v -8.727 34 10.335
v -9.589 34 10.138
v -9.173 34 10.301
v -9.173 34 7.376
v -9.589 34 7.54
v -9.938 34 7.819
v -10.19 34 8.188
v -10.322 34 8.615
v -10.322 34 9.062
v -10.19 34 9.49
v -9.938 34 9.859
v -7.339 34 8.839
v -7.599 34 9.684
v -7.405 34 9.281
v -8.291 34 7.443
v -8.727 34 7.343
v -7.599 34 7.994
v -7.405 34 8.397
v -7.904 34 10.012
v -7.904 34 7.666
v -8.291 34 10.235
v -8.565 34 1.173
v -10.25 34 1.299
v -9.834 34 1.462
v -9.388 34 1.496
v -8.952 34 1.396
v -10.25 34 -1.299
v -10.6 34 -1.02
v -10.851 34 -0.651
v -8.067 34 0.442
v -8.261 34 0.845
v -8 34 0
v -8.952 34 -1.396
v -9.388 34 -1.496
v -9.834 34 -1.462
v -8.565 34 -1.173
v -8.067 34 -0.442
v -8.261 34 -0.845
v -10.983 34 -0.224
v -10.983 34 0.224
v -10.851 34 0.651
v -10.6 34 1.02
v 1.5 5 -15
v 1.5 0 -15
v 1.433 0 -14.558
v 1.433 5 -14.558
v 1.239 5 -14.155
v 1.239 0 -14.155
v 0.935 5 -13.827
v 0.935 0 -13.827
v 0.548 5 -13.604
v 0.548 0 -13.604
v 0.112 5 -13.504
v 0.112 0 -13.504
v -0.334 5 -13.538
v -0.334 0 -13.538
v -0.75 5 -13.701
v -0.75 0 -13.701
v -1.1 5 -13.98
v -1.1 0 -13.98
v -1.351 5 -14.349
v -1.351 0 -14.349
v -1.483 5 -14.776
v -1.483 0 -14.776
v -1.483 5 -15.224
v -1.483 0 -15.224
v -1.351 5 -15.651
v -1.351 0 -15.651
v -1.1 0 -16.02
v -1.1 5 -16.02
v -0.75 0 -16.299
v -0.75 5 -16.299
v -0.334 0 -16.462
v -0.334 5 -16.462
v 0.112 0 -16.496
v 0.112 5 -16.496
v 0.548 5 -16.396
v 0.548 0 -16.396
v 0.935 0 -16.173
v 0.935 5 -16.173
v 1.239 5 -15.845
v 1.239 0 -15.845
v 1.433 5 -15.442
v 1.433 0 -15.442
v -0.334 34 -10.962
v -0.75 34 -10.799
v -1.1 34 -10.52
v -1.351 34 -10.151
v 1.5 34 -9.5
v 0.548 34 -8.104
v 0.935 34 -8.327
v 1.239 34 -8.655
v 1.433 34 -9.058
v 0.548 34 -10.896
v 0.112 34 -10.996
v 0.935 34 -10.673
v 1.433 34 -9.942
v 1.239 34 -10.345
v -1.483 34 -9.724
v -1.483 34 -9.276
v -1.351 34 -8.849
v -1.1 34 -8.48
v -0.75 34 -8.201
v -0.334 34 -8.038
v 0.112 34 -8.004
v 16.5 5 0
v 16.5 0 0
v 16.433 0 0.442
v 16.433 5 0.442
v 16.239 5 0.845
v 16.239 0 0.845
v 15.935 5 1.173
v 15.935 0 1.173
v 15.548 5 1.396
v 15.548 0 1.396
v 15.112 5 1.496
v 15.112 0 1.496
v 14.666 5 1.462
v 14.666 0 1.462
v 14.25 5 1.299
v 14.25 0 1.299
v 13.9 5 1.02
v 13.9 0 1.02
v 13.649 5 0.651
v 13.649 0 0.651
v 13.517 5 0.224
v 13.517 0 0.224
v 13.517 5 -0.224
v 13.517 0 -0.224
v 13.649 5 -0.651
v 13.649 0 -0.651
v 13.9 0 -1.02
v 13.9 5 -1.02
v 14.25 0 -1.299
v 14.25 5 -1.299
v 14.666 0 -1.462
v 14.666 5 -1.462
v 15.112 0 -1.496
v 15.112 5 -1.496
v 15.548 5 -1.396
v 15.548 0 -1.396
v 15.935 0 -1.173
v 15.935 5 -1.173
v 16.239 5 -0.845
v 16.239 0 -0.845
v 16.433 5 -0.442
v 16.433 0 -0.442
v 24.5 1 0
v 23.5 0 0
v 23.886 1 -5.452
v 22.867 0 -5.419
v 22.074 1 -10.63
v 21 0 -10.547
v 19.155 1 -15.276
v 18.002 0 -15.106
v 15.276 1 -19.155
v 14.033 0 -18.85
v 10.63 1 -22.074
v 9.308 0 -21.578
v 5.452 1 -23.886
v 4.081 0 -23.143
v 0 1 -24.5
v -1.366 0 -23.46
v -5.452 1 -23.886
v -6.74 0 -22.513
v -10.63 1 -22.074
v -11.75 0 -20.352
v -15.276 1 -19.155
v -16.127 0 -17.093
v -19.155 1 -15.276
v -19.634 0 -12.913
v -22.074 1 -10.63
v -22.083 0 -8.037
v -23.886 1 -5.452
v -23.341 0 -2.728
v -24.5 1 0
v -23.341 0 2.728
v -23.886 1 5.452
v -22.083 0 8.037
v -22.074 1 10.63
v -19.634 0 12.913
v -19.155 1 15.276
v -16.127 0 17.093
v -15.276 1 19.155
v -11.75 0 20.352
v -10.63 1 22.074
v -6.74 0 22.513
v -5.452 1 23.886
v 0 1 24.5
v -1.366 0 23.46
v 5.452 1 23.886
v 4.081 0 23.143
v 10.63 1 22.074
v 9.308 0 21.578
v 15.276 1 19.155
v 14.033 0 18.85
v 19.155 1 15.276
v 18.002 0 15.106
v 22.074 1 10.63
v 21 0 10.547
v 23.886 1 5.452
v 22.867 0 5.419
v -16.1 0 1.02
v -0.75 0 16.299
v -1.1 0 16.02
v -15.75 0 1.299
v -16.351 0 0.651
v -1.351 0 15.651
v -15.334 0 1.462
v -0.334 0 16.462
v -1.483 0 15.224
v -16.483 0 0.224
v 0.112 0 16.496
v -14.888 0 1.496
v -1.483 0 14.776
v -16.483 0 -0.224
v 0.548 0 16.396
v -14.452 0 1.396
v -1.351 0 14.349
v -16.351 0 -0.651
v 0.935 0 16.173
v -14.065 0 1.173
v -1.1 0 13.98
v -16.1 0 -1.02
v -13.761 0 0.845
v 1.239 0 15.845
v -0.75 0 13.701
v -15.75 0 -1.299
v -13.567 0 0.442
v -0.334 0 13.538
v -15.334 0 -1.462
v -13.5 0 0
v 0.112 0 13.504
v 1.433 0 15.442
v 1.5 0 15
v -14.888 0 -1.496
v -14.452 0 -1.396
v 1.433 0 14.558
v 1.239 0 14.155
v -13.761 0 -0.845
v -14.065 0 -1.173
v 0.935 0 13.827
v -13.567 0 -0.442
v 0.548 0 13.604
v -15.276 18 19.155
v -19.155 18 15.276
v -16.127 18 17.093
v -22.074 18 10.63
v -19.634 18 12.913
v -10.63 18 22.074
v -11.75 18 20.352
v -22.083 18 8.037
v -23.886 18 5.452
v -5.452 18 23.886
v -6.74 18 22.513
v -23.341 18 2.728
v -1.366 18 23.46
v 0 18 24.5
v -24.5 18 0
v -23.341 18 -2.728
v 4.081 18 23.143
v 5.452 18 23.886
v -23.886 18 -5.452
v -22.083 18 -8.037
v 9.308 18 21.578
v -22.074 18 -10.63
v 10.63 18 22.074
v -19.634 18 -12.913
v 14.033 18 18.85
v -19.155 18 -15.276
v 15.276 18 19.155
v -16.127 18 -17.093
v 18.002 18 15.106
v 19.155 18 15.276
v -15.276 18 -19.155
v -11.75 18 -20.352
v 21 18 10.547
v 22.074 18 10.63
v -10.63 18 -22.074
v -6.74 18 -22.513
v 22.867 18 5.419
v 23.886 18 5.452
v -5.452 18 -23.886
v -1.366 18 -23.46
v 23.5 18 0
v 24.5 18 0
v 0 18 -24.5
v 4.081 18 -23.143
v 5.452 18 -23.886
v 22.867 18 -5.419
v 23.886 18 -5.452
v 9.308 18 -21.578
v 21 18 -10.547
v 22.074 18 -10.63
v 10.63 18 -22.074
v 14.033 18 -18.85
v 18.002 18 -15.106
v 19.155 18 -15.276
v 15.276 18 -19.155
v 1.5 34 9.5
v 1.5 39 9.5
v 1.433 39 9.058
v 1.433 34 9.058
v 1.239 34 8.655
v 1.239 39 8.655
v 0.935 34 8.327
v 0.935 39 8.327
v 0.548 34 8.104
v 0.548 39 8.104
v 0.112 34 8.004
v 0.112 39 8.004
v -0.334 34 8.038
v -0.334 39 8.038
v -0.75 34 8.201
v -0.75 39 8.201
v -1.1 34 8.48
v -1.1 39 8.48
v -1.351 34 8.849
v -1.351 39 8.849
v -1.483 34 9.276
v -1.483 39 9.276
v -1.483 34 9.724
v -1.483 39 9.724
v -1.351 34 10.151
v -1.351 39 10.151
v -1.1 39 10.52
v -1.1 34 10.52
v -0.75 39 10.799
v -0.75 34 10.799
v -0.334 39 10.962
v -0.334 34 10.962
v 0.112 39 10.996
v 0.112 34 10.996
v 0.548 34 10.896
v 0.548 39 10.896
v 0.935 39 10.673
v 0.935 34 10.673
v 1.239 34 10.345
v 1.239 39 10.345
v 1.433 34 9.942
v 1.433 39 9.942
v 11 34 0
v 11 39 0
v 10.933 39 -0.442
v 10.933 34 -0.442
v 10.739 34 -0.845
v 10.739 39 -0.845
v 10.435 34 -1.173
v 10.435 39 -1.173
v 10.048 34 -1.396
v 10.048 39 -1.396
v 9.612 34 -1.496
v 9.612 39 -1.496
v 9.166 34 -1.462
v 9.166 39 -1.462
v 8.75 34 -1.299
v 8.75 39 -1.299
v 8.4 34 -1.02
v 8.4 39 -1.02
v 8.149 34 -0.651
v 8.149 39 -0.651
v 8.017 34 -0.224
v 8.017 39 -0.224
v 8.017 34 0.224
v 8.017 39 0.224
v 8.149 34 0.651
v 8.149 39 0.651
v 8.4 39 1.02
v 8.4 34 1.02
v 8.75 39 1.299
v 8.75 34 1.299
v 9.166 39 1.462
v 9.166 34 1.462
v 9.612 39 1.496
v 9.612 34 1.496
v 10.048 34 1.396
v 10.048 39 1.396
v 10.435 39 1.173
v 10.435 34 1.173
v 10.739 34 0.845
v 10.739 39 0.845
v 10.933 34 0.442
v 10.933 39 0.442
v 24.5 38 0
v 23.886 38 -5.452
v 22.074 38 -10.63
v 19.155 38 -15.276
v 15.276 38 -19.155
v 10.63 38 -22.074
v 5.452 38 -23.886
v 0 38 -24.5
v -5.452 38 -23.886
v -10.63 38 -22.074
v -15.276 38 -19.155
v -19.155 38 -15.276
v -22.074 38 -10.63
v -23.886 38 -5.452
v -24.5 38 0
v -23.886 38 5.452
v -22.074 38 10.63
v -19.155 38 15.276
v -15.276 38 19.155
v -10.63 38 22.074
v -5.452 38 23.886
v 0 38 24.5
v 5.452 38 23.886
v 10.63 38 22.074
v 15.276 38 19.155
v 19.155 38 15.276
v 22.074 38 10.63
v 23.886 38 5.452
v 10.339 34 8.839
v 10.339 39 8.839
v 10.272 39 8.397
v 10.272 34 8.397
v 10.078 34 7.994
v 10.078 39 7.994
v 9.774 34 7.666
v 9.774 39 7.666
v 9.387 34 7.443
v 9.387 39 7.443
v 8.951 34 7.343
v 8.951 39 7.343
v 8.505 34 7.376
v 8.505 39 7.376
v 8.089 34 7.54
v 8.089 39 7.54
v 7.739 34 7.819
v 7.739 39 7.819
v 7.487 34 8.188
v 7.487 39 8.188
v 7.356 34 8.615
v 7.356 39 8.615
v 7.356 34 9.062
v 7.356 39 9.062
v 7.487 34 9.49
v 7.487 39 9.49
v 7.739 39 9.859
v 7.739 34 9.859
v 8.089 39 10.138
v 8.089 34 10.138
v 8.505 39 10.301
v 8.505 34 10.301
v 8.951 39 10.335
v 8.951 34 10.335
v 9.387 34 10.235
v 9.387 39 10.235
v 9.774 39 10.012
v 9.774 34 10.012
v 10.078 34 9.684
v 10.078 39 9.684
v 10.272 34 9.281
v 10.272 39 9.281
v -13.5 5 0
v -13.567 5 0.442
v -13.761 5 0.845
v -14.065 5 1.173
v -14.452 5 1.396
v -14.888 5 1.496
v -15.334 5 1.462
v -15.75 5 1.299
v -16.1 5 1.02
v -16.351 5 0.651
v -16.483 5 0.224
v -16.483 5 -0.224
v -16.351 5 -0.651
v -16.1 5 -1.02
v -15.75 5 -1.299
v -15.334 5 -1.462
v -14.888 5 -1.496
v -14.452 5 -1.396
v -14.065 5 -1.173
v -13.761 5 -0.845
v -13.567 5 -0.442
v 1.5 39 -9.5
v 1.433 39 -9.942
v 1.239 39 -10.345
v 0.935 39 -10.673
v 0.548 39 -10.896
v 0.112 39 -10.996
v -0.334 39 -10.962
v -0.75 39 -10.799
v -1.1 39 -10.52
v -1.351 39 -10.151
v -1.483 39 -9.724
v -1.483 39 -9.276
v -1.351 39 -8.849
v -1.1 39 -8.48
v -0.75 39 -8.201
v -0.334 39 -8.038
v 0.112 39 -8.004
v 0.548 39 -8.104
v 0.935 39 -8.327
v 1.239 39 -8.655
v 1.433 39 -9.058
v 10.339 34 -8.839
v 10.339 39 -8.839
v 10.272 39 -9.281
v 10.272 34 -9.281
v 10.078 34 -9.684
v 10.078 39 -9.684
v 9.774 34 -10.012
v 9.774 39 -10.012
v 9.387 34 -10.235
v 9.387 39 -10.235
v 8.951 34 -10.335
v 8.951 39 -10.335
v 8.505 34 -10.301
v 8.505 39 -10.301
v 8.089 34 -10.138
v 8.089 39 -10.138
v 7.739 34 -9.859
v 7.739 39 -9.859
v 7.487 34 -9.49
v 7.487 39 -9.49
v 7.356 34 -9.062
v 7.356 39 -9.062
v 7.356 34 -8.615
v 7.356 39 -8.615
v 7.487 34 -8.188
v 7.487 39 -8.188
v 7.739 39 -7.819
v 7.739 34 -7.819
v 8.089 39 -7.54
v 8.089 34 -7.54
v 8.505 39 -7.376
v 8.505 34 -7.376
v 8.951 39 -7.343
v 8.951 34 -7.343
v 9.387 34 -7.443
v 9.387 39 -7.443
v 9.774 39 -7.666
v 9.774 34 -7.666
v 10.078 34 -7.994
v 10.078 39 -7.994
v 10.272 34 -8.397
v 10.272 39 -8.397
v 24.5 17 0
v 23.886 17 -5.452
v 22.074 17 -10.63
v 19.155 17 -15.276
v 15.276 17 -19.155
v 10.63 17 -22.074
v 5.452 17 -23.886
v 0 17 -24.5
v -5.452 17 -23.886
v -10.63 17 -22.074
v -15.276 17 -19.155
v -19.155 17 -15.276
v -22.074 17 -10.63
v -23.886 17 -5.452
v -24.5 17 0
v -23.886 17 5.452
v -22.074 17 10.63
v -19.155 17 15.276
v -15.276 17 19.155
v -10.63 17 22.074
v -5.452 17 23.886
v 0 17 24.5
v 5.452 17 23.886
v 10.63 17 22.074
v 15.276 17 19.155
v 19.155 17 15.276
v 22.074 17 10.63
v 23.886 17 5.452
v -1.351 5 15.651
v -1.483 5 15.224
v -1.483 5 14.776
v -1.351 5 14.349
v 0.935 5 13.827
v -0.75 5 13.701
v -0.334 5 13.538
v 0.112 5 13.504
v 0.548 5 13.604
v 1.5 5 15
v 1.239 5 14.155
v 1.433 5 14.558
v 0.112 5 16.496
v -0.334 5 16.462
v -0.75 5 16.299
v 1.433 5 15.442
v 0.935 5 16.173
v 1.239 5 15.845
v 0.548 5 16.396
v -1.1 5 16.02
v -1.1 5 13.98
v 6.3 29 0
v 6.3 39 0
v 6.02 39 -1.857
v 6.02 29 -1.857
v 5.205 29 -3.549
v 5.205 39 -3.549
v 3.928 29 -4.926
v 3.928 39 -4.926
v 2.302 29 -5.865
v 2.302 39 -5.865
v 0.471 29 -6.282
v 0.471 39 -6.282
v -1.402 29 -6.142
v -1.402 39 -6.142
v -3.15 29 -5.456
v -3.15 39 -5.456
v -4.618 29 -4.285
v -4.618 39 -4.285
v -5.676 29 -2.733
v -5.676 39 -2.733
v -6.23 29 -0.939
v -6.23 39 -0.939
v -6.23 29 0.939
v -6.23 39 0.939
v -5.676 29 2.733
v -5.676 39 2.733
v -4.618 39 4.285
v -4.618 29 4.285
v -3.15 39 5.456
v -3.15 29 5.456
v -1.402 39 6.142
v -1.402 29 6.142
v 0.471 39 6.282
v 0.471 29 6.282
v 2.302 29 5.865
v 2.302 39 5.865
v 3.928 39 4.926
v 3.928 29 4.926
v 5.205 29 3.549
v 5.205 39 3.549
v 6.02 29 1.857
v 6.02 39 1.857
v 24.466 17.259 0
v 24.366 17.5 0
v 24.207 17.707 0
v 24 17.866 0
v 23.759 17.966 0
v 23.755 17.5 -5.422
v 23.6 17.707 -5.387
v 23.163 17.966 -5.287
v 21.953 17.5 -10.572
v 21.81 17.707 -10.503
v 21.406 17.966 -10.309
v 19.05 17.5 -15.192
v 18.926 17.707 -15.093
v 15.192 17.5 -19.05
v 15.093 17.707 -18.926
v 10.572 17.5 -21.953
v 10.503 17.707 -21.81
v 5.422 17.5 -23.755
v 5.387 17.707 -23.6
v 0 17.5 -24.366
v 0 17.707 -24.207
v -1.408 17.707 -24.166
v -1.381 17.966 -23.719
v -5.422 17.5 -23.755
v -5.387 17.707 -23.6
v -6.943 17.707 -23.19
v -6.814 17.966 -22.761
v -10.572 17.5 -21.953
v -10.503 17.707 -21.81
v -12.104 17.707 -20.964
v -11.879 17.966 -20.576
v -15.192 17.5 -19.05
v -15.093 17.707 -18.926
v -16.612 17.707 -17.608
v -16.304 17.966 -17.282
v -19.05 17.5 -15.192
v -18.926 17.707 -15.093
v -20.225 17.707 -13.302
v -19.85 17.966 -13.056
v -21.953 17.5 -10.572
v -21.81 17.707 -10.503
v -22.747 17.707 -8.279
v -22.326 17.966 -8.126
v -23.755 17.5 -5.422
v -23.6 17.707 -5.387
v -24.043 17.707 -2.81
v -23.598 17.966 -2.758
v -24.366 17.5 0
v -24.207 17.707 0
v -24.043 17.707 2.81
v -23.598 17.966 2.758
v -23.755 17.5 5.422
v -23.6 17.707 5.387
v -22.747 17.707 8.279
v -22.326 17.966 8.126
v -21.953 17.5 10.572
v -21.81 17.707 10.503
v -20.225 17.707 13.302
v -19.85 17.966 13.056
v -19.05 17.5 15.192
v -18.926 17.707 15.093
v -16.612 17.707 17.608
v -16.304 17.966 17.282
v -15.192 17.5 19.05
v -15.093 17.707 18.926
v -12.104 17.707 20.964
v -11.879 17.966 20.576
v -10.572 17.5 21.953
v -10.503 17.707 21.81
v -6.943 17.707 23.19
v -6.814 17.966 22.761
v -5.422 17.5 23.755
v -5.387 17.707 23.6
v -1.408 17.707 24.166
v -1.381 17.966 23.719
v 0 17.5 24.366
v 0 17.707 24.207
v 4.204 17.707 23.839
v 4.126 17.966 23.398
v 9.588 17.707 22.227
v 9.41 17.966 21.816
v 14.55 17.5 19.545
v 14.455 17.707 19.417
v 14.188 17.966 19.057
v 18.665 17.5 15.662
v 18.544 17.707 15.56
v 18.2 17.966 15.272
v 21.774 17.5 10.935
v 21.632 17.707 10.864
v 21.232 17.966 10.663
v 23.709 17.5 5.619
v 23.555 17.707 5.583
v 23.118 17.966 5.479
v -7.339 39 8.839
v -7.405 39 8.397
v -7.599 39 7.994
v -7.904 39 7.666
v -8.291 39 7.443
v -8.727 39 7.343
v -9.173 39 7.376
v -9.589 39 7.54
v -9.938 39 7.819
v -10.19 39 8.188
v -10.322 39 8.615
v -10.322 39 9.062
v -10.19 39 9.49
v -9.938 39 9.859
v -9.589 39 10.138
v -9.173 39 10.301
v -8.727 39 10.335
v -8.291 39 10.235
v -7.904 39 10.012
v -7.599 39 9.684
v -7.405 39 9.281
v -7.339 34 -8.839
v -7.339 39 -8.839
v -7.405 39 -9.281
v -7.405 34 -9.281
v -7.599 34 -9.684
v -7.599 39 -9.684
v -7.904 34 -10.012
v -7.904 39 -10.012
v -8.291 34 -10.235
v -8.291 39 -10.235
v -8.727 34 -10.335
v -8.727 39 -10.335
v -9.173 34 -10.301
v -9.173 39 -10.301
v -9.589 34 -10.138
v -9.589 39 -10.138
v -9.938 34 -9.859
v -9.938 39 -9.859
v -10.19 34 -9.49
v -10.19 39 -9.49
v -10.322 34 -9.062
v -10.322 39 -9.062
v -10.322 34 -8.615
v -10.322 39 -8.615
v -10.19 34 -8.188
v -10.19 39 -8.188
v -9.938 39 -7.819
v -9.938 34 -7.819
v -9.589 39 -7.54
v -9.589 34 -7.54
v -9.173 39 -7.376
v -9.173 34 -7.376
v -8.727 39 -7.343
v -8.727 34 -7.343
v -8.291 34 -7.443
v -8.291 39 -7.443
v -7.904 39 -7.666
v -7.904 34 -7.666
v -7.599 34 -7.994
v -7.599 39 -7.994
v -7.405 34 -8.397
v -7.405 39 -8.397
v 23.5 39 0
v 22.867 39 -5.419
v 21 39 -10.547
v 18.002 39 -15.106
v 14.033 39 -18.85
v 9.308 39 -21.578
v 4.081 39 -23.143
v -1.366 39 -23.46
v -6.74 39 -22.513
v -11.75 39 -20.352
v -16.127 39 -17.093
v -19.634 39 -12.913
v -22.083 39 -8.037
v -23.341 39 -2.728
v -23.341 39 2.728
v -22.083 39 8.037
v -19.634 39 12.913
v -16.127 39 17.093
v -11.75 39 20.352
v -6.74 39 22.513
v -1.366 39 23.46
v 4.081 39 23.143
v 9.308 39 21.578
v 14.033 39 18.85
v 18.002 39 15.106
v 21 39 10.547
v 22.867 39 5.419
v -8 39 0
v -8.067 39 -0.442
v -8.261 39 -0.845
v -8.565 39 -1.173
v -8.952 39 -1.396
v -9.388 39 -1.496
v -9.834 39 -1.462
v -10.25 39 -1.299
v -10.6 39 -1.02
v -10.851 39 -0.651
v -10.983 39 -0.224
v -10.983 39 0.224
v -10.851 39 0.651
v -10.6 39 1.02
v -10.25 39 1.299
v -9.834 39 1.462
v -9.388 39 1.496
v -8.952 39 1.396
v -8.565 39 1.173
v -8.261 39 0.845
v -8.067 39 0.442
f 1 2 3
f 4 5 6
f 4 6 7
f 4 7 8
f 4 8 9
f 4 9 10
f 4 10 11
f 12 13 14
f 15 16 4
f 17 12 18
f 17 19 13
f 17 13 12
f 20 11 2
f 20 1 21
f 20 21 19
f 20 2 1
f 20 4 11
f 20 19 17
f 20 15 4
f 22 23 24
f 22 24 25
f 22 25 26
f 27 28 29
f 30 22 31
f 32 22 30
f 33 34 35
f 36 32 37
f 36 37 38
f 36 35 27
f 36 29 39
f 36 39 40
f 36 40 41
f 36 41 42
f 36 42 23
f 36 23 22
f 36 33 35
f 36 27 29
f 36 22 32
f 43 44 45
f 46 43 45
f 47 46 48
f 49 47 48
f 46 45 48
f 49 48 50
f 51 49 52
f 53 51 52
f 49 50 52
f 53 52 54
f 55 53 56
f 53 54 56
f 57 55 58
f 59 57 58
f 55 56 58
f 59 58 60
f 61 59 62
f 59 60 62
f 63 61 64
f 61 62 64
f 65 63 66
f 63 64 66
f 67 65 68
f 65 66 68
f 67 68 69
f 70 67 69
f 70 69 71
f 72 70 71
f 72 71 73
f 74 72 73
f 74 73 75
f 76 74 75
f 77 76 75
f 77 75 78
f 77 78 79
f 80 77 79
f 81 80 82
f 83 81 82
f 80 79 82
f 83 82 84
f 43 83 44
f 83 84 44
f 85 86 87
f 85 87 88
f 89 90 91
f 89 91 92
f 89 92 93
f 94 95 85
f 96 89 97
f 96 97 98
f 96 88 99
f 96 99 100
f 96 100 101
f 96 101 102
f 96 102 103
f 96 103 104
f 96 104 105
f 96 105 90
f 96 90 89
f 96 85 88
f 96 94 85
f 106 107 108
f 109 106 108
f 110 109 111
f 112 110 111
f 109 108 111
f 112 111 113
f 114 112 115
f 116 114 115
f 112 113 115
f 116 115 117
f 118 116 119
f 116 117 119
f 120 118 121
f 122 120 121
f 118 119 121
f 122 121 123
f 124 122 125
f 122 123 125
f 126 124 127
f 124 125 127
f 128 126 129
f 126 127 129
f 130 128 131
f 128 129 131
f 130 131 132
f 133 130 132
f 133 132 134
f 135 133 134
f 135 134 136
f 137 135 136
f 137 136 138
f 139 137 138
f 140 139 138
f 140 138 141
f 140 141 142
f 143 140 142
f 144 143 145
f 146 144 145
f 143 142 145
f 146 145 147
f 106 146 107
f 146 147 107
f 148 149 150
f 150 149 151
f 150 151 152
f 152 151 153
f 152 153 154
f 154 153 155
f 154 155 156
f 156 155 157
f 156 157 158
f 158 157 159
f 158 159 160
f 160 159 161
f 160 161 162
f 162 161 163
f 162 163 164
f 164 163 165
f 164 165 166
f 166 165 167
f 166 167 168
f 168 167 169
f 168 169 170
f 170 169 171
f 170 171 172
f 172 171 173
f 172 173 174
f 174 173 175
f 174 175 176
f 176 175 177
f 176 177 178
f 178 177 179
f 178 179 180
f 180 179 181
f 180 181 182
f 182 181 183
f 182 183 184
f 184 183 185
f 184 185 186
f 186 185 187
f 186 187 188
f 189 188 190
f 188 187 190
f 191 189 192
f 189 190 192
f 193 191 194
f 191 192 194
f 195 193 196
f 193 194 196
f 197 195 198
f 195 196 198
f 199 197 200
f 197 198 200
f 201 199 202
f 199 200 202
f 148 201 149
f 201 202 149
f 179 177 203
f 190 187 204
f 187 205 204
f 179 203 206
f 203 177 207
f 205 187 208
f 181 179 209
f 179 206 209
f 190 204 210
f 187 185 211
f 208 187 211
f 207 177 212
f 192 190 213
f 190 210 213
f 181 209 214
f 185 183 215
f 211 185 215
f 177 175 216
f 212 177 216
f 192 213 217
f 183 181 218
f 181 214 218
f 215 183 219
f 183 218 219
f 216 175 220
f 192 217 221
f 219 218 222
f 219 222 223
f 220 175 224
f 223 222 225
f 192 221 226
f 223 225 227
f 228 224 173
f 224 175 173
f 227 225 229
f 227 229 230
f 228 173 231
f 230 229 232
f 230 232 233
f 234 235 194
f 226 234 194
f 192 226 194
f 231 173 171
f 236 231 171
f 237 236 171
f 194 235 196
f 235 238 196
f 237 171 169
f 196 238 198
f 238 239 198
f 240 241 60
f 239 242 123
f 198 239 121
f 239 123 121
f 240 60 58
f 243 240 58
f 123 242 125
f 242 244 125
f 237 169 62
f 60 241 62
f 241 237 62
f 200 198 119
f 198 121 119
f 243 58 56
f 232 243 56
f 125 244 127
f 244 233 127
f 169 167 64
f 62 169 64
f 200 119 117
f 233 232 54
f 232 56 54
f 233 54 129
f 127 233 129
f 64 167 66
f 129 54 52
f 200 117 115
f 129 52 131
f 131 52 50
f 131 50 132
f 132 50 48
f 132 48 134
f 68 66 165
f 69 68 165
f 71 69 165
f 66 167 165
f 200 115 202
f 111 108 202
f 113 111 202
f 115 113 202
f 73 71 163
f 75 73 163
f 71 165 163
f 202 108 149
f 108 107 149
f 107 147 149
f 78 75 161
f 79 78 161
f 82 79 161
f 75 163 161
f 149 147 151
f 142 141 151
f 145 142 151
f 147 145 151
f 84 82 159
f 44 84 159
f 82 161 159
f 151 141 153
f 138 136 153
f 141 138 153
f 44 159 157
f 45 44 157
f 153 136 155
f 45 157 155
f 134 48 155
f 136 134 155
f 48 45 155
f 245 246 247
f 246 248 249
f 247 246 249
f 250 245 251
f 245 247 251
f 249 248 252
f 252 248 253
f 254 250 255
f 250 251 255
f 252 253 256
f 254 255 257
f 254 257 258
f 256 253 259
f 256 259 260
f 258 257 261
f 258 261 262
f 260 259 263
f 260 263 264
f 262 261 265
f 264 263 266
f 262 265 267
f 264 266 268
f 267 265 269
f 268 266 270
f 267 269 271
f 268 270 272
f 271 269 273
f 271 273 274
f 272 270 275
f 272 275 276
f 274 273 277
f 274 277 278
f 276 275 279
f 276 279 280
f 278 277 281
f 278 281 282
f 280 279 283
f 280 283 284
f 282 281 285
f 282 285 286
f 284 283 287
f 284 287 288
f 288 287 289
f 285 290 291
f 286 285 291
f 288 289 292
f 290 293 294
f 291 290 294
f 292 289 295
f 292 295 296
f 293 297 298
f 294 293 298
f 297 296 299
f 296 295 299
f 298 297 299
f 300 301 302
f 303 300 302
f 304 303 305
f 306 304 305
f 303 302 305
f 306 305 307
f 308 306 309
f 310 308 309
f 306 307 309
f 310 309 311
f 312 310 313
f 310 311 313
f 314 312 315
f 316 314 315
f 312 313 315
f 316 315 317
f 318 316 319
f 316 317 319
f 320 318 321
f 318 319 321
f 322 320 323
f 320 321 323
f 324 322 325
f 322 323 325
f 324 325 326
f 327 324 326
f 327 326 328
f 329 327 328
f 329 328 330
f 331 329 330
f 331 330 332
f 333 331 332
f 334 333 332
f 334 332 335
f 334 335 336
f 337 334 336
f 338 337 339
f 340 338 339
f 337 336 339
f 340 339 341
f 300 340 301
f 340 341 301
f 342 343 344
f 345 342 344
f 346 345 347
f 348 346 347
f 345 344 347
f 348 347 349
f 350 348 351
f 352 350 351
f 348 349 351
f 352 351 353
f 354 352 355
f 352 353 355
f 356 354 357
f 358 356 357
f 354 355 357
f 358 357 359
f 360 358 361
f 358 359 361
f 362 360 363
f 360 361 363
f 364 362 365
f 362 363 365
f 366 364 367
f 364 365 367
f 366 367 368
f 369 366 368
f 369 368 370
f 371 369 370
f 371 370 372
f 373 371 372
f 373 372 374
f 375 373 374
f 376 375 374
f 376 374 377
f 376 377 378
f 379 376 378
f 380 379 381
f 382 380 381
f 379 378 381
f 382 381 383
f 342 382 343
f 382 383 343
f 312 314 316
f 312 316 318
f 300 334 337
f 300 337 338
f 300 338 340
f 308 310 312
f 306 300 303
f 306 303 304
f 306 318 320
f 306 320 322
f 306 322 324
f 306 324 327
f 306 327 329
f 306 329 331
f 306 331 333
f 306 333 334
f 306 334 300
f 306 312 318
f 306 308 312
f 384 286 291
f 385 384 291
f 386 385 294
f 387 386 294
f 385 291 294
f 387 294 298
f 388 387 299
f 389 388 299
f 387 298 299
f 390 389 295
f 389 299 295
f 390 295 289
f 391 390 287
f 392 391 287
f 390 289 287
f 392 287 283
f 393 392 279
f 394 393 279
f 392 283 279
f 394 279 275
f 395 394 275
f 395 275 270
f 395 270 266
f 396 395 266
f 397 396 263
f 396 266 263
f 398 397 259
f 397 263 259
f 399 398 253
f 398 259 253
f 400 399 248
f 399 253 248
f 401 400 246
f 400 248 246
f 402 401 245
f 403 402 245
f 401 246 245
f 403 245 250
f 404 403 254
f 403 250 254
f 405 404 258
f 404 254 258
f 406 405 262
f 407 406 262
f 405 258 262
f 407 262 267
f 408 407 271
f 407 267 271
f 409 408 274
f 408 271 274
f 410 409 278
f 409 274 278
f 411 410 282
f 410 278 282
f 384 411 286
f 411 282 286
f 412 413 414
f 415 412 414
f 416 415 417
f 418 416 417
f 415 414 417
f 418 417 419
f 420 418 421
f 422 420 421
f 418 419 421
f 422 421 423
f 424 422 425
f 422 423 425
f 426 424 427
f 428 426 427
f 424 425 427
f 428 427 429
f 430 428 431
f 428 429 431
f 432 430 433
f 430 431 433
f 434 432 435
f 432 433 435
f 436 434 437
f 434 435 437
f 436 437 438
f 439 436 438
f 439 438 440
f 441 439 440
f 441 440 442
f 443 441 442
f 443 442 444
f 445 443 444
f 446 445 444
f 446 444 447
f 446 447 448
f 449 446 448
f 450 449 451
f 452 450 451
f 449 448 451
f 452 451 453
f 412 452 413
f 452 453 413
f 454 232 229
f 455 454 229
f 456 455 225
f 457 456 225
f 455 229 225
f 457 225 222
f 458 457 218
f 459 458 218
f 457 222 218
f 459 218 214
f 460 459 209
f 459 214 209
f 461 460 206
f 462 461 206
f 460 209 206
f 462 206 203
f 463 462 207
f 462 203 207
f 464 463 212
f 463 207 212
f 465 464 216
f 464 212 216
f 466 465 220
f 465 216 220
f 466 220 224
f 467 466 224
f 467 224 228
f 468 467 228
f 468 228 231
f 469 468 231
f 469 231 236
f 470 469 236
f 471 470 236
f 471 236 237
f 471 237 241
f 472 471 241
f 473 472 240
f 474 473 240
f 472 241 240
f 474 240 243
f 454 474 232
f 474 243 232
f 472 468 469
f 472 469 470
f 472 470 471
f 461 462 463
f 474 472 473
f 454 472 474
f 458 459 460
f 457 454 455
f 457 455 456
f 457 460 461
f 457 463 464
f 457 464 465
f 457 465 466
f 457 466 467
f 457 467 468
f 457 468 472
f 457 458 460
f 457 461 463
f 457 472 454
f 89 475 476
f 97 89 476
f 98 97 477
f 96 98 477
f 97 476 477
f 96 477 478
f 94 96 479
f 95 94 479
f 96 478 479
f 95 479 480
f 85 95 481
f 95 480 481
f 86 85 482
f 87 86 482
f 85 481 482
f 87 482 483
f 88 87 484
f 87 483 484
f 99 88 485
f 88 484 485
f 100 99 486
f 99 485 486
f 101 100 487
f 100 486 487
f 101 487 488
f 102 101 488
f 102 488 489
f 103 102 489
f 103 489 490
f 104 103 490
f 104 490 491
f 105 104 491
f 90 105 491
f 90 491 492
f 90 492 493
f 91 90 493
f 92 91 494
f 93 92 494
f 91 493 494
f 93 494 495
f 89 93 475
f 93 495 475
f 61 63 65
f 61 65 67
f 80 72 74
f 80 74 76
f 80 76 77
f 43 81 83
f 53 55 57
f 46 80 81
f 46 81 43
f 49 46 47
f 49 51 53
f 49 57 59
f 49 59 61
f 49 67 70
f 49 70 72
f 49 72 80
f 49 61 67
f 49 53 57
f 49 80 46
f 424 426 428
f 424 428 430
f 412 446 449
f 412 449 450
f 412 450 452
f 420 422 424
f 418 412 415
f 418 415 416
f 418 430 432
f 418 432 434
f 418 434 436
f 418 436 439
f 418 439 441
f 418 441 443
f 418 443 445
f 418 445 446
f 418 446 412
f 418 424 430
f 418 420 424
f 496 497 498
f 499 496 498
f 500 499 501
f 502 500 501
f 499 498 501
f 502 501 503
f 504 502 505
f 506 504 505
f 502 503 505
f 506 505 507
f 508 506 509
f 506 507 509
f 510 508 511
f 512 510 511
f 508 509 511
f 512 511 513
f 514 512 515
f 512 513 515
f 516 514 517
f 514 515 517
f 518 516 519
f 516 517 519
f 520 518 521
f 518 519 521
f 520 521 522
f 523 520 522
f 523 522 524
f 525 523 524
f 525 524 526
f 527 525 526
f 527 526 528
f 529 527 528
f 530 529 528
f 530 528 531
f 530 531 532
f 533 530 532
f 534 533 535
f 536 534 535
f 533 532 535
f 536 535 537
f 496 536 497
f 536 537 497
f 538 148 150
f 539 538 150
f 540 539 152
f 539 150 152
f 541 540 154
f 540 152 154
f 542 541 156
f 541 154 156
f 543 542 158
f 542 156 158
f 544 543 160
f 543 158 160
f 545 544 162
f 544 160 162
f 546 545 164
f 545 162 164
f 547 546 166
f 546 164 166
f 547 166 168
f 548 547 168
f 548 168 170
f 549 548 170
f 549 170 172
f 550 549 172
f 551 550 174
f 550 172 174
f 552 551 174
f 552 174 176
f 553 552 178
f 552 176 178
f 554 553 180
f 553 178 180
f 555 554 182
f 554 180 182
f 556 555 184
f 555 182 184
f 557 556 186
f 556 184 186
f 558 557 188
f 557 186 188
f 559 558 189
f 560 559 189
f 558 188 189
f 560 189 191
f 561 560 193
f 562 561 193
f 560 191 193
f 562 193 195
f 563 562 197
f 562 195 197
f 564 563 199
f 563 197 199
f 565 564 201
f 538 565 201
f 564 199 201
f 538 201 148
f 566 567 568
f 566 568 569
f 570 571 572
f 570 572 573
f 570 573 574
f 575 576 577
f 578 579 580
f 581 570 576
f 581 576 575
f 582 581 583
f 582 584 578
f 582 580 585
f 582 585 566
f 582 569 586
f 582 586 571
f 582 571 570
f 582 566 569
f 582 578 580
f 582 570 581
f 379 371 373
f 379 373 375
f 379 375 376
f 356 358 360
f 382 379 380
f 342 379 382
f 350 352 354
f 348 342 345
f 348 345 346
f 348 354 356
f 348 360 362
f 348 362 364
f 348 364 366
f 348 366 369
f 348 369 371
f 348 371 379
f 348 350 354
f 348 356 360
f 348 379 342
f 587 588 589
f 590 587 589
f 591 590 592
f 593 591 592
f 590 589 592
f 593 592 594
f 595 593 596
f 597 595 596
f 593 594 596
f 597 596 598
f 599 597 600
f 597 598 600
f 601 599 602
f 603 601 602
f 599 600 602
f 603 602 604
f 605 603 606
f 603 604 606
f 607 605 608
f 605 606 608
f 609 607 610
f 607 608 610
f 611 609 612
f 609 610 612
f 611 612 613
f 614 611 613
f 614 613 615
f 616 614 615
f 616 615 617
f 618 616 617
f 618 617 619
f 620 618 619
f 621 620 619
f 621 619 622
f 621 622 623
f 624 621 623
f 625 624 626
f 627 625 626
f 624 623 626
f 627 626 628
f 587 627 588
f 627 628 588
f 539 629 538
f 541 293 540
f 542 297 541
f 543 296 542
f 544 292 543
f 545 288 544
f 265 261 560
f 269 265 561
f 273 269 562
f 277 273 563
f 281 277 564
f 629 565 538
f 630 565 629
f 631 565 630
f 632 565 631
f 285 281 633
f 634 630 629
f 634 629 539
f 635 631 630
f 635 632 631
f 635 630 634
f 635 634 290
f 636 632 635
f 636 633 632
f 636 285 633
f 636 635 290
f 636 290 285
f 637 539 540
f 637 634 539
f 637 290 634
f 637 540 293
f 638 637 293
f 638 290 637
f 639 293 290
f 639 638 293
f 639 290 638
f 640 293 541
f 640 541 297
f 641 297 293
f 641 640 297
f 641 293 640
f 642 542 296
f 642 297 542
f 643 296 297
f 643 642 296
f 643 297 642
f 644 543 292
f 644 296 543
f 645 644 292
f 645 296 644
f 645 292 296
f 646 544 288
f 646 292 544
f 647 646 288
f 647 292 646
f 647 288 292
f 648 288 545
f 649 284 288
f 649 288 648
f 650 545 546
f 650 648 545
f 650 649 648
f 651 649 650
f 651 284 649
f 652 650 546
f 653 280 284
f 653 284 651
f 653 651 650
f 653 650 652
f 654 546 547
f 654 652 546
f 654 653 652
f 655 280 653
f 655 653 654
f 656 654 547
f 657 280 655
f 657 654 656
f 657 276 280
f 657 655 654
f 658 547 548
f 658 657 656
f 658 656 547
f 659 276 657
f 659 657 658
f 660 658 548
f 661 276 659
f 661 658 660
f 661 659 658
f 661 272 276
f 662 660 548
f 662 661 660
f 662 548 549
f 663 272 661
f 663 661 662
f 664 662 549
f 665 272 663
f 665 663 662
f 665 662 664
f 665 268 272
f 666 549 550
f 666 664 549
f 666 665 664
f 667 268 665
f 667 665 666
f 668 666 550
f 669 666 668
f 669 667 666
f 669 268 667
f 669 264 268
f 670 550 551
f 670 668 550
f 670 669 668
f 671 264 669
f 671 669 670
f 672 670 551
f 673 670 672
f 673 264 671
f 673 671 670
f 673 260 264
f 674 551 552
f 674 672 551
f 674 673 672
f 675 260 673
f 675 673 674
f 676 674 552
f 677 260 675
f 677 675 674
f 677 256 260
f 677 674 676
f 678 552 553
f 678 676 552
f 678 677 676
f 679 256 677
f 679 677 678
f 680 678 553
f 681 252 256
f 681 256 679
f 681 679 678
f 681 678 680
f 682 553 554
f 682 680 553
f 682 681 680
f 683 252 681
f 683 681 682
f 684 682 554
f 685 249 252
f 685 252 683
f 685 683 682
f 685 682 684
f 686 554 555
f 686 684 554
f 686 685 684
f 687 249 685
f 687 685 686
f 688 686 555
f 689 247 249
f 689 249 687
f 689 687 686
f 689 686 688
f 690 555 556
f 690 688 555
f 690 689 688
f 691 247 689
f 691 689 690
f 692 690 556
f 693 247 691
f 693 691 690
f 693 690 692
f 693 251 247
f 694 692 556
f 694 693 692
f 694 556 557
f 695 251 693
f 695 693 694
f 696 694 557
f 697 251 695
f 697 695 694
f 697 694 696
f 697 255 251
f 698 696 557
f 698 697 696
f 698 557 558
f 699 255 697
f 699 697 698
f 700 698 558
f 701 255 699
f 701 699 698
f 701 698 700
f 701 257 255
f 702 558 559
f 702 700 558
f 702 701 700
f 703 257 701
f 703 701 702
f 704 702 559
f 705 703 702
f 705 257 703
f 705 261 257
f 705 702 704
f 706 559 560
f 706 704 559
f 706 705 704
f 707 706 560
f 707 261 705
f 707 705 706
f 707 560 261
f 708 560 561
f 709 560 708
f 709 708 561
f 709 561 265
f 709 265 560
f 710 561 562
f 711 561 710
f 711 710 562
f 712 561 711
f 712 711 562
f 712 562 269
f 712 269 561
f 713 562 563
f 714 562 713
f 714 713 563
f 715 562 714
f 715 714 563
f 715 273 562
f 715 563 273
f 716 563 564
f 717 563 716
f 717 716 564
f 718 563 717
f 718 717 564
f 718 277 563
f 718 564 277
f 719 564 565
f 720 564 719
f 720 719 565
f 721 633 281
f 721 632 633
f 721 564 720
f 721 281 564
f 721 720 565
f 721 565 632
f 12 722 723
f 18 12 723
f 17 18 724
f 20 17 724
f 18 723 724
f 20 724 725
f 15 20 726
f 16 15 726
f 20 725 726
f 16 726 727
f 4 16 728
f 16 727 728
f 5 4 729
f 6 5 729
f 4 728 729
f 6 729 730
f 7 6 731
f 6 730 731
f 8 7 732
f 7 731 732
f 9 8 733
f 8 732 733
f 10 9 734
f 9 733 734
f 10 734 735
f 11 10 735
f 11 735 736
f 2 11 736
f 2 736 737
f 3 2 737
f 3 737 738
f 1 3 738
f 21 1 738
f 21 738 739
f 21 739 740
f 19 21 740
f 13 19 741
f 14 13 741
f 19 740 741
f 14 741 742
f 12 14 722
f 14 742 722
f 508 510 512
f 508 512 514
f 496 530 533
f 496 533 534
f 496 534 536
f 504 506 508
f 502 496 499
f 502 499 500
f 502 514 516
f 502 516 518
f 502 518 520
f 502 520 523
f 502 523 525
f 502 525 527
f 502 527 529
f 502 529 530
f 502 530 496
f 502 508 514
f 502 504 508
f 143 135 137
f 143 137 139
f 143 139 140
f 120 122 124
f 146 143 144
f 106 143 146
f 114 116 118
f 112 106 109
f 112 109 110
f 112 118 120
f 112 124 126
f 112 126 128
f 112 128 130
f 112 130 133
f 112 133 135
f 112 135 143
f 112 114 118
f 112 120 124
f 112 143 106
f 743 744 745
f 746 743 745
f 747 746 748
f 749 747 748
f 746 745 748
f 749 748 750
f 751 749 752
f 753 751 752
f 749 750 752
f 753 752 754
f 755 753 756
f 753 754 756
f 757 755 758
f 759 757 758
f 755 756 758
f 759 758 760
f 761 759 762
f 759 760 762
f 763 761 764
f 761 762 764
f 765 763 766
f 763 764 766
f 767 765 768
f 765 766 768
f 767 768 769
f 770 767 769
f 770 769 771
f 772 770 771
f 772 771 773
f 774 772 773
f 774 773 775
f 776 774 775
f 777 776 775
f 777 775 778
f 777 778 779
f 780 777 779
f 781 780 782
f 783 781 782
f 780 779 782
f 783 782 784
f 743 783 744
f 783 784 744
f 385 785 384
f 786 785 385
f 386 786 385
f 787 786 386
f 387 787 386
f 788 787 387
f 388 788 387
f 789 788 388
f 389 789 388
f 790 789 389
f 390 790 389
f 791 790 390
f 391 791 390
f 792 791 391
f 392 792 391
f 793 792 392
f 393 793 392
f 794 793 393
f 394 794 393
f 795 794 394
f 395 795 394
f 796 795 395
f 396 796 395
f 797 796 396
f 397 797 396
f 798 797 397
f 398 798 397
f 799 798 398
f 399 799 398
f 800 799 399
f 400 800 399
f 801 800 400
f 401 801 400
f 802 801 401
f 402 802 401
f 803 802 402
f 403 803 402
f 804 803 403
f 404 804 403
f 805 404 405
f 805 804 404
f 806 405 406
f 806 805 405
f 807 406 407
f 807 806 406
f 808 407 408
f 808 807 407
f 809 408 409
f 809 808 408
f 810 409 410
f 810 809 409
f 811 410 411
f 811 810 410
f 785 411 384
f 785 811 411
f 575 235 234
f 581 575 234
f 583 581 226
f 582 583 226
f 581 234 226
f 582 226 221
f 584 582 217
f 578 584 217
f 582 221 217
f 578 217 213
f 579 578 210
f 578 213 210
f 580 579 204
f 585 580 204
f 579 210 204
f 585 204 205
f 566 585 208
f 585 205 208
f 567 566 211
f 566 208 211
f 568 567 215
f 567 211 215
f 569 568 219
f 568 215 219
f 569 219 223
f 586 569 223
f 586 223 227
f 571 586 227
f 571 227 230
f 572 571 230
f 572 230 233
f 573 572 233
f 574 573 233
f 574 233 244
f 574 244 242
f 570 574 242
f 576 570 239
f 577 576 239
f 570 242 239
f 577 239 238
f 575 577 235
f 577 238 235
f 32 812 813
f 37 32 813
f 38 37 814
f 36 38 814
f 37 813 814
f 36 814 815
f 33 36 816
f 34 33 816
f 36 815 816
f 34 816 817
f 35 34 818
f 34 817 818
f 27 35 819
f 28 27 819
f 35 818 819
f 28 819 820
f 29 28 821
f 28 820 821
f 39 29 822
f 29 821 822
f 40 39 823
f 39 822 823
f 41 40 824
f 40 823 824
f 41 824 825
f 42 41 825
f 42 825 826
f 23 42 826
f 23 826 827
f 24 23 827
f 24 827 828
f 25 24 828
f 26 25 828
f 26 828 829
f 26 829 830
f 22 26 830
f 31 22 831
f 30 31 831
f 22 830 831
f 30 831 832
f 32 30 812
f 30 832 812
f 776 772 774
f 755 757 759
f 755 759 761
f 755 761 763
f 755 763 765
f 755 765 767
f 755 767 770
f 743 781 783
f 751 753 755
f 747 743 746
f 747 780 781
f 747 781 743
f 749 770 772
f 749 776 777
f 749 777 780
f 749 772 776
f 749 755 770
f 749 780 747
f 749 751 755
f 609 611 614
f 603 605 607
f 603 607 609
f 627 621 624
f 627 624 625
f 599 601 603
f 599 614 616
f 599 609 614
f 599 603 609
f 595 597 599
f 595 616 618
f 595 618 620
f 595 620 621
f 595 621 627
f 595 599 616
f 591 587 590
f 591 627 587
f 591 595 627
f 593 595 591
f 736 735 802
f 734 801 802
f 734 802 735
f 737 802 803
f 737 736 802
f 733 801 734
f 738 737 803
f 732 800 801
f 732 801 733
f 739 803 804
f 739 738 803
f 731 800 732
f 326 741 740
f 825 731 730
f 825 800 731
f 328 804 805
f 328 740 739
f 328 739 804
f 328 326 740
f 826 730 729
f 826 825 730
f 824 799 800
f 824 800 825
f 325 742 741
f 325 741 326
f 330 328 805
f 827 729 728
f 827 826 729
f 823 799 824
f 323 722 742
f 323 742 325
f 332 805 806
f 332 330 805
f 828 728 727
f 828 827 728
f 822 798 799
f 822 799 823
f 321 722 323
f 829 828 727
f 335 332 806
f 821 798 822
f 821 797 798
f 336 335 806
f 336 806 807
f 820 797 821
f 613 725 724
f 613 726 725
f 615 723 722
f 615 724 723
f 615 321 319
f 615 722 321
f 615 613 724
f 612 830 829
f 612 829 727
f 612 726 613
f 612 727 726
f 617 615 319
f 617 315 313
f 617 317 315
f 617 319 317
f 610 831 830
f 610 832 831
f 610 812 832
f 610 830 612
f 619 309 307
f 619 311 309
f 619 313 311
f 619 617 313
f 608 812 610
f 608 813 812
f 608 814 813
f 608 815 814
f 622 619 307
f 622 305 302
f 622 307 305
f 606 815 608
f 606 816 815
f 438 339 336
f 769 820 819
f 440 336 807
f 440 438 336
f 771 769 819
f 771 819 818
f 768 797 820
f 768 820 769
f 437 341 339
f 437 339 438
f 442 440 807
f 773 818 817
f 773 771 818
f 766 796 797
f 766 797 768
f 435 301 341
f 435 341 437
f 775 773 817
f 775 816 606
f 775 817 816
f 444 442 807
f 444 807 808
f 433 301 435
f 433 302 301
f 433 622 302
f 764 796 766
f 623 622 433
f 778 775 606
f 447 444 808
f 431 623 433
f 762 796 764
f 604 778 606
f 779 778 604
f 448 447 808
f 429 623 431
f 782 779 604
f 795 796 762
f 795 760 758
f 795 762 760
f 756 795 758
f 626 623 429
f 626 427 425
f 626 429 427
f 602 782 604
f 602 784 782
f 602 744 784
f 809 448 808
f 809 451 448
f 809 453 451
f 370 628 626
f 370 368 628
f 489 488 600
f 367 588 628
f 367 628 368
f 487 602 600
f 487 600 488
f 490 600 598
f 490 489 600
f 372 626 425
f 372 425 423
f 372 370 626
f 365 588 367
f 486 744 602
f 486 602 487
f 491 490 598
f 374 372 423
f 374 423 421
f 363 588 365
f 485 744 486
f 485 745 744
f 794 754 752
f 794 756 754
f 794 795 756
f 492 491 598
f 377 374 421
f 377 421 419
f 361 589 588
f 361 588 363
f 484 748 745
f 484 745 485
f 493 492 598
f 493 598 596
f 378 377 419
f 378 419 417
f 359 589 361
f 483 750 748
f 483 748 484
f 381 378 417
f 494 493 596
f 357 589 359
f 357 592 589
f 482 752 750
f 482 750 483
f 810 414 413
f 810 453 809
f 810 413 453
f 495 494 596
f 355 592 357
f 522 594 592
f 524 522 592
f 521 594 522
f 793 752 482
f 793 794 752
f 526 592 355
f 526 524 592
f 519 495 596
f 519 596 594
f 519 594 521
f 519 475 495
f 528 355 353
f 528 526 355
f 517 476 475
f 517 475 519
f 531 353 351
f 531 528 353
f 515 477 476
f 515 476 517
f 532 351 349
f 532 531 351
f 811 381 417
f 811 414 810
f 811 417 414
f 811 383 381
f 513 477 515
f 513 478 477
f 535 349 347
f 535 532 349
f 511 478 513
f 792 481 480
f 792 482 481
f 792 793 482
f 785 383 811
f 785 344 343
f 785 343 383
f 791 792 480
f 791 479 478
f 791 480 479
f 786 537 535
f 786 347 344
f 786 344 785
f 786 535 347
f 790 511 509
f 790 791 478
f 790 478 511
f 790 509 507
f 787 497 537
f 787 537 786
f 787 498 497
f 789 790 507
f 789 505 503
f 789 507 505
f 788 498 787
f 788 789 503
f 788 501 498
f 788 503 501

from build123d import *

# Parameters (mm, degrees)
SKETCH_1_R          = 24.5
EXTRUDE_1_DEPTH     = 18
FILLET_1_R          = 1
SKETCH_2_R          = 24.5
EXTRUDE_2_DEPTH     = 21
CHAMFER_1_SIZE      = 1
CHAMFER_2_SIZE      = 1
SKETCH_4_R          = 6.3
CUT_EXTRUDE_1_DEPTH = 10
SKETCH_5_R          = 1.5
CUT_EXTRUDE_2_DEPTH = 5
SKETCH_6_R          = 1.5
CUT_EXTRUDE_3_DEPTH = 5


with BuildPart() as part:
    # 草图1 → 凸台-拉伸1 (new body)
    with BuildSketch(Plane(origin=(0, 0, 0), x_dir=(1, 0, 0), z_dir=(0, 1, 0))):
        Circle(SKETCH_1_R)
    extrude(amount=EXTRUDE_1_DEPTH)

    # 圆角1
    fillet_1_edges = [part.edges().sort_by_distance(p)[0] for p in [
        (-24.5, 18, 0),
    ]]
    fillet(fillet_1_edges, radius=FILLET_1_R)

    # 草图2 → 凸台-拉伸2 (add)
    with BuildSketch(Plane(origin=(0, 18, 0), x_dir=(1, 0, 0), z_dir=(0, 1, 0))):
        Circle(SKETCH_2_R)
    extrude(amount=EXTRUDE_2_DEPTH)

    # 倒角1
    chamfer_1_edges = [part.edges().sort_by_distance(p)[0] for p in [
        (-24.5, 39, 0),
    ]]
    chamfer(chamfer_1_edges, length=CHAMFER_1_SIZE)

    # 倒角2
    chamfer_2_edges = [part.edges().sort_by_distance(p)[0] for p in [
        (-24.5, 0, 0),
    ]]
    chamfer(chamfer_2_edges, length=CHAMFER_2_SIZE)

    # 草图4 → 切除-拉伸1 (cut)
    with BuildSketch(Plane(origin=(0, 39, 0), x_dir=(1, 0, 0), z_dir=(0, 1, 0))):
        Circle(SKETCH_4_R)
    extrude(amount=-CUT_EXTRUDE_1_DEPTH, mode=Mode.SUBTRACT)

    # 草图5 → 切除-拉伸2 (cut)
    with BuildSketch(Plane(origin=(0, 39, 0), x_dir=(1, 0, 0), z_dir=(0, 1, 0))):
        with Locations((9.5, 0)):
            Circle(SKETCH_5_R)
        with Locations((0, -9.5)):
            Circle(SKETCH_5_R)
        with Locations((-9.5, 0)):
            Circle(SKETCH_5_R)
        with Locations((0, 9.5)):
            Circle(SKETCH_5_R)
        with Locations((8.838834765, 8.838834765)):
            Circle(SKETCH_5_R)
        with Locations((8.838834765, -8.838834765)):
            Circle(SKETCH_5_R)
        with Locations((-8.838834765, -8.838834765)):
            Circle(SKETCH_5_R)
        with Locations((-8.838834765, 8.838834765)):
            Circle(SKETCH_5_R)
    extrude(amount=-CUT_EXTRUDE_2_DEPTH, mode=Mode.SUBTRACT)

    # 草图6 → 切除-拉伸3 (cut)
    with BuildSketch(Plane.XZ):
        with Locations((15, 0)):
            Circle(SKETCH_6_R)
        with Locations((0, -15)):
            Circle(SKETCH_6_R)
        with Locations((-15, 0)):
            Circle(SKETCH_6_R)
        with Locations((0, 15)):
            Circle(SKETCH_6_R)
    extrude(amount=-CUT_EXTRUDE_3_DEPTH, mode=Mode.SUBTRACT)


solid = part.part
